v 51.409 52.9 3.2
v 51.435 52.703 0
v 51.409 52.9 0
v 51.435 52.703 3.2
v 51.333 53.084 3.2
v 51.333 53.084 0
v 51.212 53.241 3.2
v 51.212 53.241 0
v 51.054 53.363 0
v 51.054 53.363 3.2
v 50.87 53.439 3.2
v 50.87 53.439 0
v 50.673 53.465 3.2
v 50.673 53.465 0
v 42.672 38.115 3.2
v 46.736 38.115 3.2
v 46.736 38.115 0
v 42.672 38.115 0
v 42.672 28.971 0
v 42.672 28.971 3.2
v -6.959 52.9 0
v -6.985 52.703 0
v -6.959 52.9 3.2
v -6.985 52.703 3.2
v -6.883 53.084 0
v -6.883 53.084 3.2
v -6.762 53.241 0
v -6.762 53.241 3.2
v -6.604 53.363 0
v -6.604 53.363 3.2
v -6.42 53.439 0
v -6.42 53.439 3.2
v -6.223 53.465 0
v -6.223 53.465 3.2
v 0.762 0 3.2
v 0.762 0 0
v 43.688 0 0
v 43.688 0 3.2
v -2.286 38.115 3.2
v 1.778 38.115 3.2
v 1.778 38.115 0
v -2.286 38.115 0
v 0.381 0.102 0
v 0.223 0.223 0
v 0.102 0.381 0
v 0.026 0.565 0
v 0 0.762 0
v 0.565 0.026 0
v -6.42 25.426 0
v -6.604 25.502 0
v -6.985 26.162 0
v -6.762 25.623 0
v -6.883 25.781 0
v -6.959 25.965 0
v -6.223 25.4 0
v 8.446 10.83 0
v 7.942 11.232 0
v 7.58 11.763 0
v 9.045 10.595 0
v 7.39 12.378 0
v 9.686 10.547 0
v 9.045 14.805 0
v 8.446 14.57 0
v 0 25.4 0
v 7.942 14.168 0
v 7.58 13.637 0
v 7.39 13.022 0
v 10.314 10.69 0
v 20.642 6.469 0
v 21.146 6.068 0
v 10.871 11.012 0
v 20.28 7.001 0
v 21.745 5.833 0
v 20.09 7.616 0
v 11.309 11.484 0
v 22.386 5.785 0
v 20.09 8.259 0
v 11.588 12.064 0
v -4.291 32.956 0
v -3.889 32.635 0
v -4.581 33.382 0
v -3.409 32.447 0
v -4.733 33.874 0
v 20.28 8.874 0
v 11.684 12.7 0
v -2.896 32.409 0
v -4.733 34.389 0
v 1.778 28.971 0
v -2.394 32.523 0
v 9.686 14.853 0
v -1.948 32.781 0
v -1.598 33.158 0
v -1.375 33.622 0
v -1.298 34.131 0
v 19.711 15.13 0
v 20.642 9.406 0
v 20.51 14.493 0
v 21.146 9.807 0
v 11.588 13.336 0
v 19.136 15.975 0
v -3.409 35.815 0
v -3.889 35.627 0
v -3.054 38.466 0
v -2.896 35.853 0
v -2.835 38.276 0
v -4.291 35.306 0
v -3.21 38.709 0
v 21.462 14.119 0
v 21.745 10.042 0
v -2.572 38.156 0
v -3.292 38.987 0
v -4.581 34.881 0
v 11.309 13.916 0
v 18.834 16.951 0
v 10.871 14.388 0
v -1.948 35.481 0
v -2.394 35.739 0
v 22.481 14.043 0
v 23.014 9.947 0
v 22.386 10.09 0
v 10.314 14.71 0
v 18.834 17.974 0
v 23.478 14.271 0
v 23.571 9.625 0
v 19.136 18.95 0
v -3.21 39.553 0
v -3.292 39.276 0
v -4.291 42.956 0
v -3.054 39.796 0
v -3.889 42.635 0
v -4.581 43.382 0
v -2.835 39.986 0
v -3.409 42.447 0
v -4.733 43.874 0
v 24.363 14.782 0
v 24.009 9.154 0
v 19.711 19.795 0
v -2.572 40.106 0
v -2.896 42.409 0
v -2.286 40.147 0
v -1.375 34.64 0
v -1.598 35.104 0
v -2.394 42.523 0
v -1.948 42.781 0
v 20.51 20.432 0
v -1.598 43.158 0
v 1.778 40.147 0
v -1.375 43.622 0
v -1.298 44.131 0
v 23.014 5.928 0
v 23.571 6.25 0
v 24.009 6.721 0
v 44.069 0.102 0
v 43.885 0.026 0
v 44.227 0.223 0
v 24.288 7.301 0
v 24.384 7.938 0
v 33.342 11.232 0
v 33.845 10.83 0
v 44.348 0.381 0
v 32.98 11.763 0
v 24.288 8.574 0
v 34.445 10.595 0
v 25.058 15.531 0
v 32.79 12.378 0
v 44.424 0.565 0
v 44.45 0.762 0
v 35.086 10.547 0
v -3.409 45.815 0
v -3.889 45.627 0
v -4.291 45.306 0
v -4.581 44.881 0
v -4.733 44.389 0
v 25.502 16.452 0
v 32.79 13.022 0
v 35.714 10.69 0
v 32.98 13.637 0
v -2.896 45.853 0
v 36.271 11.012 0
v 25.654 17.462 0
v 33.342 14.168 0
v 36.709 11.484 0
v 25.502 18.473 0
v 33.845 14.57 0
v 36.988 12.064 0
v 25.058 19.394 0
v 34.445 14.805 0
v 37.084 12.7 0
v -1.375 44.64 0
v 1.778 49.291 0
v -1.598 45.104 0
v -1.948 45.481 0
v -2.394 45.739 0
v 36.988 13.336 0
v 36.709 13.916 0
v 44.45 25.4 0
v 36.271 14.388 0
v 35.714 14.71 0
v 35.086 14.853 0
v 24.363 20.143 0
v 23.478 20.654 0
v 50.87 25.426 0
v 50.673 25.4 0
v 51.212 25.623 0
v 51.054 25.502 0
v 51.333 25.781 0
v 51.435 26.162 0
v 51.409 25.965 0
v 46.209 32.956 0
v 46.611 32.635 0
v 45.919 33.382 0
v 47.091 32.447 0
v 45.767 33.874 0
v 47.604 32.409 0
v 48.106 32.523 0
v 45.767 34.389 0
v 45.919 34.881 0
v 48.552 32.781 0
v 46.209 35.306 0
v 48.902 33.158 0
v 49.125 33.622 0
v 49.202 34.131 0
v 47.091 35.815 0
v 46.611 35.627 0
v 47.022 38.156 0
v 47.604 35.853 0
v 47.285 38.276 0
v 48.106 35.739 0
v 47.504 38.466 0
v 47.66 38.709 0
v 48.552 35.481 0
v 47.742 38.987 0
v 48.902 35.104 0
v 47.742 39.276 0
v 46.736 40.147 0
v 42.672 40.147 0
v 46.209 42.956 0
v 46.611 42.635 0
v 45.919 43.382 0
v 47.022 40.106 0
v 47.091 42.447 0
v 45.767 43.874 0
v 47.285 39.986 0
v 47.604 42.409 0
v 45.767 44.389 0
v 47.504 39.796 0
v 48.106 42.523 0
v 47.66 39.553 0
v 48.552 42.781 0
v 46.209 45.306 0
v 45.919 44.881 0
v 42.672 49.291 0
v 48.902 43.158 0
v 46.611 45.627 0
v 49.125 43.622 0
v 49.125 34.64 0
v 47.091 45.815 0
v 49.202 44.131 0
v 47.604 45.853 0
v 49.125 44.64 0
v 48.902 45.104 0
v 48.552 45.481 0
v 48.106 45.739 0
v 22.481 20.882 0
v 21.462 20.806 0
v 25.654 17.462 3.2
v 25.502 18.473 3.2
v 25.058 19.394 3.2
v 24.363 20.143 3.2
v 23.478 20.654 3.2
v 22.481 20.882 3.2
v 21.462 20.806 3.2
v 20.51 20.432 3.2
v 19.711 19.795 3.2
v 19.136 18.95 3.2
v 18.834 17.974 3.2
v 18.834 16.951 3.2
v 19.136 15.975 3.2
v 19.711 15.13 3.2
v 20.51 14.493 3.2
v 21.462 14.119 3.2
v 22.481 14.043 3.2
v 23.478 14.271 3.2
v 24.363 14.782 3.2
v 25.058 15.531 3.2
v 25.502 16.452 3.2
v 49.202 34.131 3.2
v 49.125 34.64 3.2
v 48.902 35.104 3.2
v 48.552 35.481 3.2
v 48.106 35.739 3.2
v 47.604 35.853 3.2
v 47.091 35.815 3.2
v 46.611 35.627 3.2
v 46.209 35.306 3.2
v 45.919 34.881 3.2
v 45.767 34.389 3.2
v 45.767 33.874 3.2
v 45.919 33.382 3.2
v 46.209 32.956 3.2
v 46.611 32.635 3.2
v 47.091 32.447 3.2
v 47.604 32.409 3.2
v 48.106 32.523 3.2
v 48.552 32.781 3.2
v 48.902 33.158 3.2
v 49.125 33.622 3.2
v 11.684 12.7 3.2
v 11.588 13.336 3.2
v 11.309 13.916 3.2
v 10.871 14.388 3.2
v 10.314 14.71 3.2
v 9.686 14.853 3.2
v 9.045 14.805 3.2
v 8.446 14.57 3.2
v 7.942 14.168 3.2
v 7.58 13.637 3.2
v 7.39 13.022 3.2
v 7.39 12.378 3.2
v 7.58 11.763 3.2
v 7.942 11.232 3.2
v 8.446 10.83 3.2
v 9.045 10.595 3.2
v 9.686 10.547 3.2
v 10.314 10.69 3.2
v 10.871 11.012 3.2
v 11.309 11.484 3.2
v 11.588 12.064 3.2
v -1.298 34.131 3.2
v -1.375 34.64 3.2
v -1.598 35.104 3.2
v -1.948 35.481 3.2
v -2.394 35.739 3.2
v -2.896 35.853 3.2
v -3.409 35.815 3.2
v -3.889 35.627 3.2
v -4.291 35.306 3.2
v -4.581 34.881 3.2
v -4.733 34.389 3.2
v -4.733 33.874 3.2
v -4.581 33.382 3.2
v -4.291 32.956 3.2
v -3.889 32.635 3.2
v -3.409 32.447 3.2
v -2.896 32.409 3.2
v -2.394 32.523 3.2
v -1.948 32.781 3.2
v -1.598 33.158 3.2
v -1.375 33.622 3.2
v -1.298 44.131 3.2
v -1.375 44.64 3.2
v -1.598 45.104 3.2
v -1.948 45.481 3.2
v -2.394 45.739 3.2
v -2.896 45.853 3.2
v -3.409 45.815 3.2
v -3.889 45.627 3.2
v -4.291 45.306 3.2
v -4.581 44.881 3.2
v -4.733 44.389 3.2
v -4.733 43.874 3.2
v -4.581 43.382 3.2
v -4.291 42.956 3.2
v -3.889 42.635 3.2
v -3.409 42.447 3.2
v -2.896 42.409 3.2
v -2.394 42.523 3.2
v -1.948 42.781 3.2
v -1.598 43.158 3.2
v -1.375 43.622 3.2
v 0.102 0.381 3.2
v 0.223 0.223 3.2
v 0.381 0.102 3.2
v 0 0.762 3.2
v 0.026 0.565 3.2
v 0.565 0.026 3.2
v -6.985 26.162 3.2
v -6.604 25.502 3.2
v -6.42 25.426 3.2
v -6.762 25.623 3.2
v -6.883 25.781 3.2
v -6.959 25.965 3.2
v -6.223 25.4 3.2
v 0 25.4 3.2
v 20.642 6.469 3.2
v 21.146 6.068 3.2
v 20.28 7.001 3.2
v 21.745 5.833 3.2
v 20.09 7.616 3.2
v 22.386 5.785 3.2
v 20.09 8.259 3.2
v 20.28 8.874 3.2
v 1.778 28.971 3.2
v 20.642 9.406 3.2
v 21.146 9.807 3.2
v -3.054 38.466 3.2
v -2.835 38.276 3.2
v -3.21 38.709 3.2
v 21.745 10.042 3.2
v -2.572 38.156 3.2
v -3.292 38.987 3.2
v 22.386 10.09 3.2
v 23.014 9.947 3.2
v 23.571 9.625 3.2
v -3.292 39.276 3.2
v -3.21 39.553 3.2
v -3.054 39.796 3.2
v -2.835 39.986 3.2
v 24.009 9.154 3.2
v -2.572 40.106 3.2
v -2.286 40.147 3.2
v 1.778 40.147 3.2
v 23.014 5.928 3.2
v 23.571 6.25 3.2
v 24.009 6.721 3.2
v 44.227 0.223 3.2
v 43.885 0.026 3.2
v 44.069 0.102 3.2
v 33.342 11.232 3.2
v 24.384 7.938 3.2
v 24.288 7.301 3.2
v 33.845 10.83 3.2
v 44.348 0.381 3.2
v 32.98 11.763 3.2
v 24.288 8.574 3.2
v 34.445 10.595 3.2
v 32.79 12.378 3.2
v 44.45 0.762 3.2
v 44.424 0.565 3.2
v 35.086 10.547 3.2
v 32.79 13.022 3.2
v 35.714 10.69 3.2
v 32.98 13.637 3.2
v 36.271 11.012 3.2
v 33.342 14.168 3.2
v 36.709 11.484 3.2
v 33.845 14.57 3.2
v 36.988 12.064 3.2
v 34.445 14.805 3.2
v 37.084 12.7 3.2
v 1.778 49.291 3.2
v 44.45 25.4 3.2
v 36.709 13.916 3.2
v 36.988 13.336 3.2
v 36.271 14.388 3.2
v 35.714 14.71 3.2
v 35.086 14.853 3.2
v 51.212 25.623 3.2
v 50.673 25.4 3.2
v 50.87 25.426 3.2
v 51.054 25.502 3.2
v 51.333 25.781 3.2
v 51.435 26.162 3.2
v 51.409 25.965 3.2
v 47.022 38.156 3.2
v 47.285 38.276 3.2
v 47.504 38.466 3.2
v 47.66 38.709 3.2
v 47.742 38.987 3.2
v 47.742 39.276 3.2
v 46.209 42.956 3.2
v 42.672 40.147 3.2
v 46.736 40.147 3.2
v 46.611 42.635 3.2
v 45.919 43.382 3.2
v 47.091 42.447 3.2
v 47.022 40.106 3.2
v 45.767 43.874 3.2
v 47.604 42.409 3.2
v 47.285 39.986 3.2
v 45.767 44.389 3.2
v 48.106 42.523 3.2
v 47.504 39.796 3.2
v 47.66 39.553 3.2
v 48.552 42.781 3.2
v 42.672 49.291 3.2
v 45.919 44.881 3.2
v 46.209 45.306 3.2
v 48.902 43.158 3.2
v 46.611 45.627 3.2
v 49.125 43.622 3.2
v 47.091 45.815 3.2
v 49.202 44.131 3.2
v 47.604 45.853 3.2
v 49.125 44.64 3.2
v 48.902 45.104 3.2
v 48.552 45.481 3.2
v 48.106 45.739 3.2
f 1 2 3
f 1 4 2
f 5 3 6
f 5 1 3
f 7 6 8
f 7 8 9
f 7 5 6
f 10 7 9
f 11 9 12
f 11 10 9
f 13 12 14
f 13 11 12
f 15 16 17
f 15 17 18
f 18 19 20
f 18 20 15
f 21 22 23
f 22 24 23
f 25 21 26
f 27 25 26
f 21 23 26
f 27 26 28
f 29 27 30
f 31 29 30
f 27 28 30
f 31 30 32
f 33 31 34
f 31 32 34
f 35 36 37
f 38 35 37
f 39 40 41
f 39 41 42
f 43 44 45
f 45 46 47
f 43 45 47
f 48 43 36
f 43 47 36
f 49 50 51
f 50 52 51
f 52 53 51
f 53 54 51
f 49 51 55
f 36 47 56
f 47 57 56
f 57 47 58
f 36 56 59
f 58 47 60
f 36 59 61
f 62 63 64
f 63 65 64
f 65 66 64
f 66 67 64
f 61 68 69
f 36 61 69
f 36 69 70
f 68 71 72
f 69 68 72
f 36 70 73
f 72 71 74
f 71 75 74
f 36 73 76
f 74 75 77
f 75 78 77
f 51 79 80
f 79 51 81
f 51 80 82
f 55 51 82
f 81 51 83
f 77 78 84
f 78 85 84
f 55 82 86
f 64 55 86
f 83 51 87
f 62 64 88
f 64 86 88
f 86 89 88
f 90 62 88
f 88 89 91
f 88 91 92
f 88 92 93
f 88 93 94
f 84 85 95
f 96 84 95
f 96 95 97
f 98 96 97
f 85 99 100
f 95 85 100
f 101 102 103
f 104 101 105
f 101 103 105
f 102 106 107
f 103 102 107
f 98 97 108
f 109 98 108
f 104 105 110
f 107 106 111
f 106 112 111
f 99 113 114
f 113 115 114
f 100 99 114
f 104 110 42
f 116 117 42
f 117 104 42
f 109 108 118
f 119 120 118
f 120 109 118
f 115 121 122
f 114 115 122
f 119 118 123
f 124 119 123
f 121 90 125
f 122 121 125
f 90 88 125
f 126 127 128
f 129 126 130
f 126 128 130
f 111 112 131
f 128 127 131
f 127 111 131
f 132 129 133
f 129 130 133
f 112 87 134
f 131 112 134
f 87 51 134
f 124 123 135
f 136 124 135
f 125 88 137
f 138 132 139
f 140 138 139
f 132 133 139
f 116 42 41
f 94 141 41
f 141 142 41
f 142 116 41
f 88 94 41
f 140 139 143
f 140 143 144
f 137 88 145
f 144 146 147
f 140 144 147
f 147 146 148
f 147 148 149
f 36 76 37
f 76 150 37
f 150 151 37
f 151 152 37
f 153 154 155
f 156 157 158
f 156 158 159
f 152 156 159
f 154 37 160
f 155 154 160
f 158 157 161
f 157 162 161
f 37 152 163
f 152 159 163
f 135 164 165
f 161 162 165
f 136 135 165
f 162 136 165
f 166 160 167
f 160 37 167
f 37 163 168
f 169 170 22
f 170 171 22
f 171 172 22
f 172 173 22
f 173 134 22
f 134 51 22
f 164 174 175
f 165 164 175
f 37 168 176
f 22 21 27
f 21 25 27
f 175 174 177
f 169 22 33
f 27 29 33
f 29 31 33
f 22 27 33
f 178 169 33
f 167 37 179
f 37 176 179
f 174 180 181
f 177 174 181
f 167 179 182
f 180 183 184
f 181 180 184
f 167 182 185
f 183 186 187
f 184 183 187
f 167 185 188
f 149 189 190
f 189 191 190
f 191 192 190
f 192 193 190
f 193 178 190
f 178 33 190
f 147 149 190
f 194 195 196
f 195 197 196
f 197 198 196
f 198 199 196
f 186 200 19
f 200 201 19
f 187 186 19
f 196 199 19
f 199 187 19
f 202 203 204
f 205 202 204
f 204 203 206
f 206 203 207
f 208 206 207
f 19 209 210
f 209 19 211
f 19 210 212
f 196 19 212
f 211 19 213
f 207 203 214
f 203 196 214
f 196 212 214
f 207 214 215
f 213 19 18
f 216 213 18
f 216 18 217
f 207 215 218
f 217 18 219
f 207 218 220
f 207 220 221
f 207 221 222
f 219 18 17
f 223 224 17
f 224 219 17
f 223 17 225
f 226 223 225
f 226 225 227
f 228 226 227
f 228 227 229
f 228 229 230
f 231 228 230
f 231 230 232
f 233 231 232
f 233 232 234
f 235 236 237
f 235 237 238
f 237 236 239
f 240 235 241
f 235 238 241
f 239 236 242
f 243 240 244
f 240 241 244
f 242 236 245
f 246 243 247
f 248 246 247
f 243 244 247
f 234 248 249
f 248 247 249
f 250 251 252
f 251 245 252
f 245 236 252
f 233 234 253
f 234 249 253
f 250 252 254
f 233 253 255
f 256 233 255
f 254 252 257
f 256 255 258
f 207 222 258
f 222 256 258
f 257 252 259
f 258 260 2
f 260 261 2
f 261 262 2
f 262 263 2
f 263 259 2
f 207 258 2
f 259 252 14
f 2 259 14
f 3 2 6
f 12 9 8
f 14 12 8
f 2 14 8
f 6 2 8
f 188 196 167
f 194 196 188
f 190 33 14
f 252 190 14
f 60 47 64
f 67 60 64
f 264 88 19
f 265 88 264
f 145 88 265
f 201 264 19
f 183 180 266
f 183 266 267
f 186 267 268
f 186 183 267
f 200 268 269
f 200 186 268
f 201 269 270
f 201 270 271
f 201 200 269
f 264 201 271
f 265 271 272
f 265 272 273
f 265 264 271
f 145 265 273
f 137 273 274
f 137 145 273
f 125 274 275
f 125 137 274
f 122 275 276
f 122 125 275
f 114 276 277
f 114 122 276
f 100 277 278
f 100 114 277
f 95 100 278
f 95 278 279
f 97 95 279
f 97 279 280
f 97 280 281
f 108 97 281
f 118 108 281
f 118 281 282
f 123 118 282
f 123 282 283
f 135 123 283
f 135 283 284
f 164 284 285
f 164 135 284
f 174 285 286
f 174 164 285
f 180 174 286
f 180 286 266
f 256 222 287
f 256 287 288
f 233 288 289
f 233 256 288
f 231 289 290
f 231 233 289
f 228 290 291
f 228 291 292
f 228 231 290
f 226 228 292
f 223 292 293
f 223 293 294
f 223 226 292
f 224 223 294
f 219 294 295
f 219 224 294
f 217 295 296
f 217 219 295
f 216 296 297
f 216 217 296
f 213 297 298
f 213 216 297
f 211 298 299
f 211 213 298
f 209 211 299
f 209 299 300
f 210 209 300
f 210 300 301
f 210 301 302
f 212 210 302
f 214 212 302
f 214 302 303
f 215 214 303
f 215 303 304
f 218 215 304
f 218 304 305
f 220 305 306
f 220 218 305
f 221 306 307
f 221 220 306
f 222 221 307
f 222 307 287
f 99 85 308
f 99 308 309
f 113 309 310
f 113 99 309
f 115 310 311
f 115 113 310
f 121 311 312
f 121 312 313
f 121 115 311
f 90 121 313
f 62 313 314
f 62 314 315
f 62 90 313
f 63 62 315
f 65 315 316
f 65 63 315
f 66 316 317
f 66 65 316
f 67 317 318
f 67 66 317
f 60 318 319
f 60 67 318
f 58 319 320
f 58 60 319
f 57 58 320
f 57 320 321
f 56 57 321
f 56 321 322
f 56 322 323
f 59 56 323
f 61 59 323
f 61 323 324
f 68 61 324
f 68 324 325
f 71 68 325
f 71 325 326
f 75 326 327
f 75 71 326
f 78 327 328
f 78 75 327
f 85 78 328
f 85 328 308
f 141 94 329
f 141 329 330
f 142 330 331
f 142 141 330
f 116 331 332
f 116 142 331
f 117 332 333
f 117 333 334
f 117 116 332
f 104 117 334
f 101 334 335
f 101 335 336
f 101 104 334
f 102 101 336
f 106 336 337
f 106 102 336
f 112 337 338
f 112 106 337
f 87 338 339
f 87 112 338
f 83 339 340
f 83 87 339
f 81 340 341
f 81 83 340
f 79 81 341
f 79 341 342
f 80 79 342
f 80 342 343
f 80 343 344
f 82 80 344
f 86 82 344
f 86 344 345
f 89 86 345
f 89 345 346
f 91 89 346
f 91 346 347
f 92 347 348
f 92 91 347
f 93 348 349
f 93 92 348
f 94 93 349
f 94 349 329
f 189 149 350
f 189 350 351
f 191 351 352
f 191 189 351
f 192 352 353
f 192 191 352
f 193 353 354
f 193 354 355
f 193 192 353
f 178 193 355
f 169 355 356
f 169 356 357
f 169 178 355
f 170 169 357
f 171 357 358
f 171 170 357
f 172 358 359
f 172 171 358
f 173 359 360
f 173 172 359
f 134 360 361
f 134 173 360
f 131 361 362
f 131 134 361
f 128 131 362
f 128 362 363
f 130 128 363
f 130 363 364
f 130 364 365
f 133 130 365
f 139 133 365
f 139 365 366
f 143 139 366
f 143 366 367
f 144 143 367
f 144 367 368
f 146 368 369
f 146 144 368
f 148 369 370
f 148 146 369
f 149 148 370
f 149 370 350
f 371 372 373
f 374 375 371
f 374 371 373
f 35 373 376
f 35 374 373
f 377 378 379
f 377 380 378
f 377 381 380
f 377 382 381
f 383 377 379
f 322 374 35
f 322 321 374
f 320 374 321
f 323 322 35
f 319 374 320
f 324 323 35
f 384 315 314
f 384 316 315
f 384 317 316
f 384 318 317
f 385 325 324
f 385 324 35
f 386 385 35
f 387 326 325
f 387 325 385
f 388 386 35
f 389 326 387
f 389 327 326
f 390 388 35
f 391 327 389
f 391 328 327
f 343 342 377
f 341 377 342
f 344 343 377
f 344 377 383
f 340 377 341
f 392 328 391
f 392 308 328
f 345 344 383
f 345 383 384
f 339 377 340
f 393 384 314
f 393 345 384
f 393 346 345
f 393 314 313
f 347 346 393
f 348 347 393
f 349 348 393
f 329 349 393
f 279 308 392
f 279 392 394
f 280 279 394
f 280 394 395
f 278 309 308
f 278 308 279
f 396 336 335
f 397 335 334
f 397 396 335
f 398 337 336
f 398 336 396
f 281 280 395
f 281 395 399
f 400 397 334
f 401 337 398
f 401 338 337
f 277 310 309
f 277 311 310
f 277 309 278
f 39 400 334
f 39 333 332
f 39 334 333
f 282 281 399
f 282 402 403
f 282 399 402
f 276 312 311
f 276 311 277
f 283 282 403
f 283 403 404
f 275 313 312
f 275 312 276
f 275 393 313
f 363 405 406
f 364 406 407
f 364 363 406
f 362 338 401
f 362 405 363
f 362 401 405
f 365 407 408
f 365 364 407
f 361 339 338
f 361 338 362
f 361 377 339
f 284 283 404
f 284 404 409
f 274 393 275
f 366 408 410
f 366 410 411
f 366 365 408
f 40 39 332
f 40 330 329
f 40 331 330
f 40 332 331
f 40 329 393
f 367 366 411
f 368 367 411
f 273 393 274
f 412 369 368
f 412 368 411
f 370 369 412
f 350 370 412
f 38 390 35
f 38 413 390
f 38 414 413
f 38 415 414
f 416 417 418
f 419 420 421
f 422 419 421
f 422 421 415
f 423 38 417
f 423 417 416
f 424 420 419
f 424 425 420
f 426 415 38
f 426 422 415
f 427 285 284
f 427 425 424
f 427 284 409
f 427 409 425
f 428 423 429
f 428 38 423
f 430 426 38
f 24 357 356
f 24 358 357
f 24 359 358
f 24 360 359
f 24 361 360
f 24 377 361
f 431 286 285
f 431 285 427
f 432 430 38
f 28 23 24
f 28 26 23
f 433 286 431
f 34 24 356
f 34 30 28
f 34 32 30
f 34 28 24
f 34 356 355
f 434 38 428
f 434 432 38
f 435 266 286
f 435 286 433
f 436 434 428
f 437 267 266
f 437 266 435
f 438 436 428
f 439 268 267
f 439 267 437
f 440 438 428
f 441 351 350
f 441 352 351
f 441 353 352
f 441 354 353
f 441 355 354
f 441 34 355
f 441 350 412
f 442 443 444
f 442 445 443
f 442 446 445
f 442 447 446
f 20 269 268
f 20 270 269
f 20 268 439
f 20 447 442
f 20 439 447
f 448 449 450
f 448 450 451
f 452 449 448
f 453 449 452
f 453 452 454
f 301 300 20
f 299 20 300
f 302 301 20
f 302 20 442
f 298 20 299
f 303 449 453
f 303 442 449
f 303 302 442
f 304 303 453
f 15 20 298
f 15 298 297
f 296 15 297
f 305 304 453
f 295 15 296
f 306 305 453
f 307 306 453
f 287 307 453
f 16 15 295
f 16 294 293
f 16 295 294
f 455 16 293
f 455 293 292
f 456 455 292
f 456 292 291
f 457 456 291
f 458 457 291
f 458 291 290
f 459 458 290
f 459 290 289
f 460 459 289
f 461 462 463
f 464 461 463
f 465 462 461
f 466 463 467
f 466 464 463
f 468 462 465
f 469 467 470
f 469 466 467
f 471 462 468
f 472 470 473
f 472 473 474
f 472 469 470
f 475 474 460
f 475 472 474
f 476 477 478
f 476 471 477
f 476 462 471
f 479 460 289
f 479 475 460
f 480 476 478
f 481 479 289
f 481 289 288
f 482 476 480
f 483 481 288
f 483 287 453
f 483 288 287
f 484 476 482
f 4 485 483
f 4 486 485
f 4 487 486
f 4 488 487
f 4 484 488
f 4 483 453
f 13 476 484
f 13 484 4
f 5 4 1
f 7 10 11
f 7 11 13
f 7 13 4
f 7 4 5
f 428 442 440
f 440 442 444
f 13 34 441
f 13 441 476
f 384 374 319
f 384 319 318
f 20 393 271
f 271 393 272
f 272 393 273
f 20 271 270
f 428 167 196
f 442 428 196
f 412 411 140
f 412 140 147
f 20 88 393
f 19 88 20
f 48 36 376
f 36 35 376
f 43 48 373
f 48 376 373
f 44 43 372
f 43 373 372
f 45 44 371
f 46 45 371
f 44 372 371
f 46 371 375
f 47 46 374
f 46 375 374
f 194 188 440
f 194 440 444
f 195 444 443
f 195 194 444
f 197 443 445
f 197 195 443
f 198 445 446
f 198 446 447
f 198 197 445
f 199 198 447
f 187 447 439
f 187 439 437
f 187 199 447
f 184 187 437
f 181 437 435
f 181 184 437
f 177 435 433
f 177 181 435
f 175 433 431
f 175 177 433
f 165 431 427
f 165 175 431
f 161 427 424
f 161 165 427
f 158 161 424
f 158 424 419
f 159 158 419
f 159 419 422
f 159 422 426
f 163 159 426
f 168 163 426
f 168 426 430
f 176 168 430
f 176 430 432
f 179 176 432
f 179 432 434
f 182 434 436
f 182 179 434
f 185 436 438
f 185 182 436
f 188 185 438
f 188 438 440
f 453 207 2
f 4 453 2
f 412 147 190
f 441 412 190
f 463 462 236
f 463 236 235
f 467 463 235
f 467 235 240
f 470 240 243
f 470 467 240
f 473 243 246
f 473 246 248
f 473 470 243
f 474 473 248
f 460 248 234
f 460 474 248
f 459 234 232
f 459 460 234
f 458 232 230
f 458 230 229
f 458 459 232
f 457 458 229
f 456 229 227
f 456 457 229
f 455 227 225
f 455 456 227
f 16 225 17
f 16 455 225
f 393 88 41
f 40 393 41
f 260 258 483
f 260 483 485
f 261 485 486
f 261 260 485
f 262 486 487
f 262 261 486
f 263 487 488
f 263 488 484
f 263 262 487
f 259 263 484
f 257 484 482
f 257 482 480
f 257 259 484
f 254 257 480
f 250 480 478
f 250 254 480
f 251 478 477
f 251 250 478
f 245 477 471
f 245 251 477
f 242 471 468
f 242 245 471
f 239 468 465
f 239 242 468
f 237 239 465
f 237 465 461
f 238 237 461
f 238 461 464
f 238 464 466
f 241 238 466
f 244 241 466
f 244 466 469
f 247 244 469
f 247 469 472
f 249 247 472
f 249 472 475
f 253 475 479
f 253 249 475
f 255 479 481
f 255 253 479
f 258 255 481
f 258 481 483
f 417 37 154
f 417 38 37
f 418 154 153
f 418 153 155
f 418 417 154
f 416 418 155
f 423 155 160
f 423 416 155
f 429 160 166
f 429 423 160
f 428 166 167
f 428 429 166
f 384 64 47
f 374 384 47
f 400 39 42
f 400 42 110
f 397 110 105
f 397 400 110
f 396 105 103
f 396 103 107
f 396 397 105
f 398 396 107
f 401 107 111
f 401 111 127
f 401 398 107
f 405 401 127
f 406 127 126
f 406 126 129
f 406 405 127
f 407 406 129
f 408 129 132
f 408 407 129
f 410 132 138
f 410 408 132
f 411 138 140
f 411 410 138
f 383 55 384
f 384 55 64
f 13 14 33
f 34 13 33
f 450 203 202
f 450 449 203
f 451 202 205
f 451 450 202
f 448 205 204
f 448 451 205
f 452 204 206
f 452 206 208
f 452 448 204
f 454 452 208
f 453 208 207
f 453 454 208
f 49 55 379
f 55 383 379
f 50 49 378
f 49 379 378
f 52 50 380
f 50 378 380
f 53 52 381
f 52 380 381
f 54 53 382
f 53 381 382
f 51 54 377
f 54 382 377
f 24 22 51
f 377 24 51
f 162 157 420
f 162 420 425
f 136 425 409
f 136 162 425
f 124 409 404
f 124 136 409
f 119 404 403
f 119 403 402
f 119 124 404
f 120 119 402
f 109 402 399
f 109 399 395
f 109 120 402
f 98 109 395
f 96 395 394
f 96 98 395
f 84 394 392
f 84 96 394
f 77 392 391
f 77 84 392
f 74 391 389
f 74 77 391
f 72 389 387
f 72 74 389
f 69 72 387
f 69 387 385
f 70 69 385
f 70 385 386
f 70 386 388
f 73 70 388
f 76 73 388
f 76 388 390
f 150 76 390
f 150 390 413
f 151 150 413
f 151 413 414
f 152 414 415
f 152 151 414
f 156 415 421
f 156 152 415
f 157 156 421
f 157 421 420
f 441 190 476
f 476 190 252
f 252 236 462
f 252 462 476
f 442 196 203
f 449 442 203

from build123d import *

# Parameters (mm, degrees)
SKETCH1_R           = 2.159
SKETCH1_R_2         = 1.7272
SKETCH1_R_3         = 3.429
SKETCH1_W           = 40.894
SKETCH1_H           = 20.32
BOSS_EXTRUDE1_DEPTH = 3.2004
CUT_EXTRUDE1_DEPTH  = 3.2004
FILLET1_R           = 0.762


with BuildPart() as part:
    # Sketch1 → Boss-Extrude1 (new body)
    with BuildSketch(Plane.XY):
        Polygon((0, 0), (44.45, 0), (44.45, 25.4), (51.435, 25.4), (51.435, 53.464659022), (-6.985, 53.464659022), (-6.985, 25.4), (0, 25.4), align=None)
        with Locations((9.525, 12.7)):
            Circle(SKETCH1_R, mode=Mode.SUBTRACT)
        with Locations((34.925, 12.7)):
            Circle(SKETCH1_R, mode=Mode.SUBTRACT)
        with Locations((47.475, 34.131115311)):
            Circle(SKETCH1_R_2, mode=Mode.SUBTRACT)
        with Locations((-3.025, 44.131115311)):
            Circle(SKETCH1_R_2, mode=Mode.SUBTRACT)
        with Locations((-3.025, 34.131115311)):
            Circle(SKETCH1_R_2, mode=Mode.SUBTRACT)
        with Locations((47.475, 44.131115311)):
            Circle(SKETCH1_R_2, mode=Mode.SUBTRACT)
        with Locations((22.225, 17.4625)):
            Circle(SKETCH1_R_3, mode=Mode.SUBTRACT)
        with Locations((22.225, 7.9375)):
            Circle(SKETCH1_R, mode=Mode.SUBTRACT)
        with Locations((22.225, 39.131115311)):
            Rectangle(SKETCH1_W, SKETCH1_H, mode=Mode.SUBTRACT)
    extrude(amount=BOSS_EXTRUDE1_DEPTH)

    # Sketch2 → Cut-Extrude1 (cut)
    with BuildSketch(Plane.XY.offset(3.2004)):
        with BuildLine():
            Line((-2.286, 40.147115311), (1.778, 40.147115311))
            Line((1.778, 40.147115311), (1.778, 38.115115311))
            Line((1.778, 38.115115311), (-2.286, 38.115115311))
            ThreePointArc((-2.286, 38.115115311), (-3.302, 39.131115311), (-2.286, 40.147115311))
        make_face()
        with BuildLine():
            Line((42.672, 40.147115311), (46.736, 40.147115311))
            ThreePointArc((46.736, 40.147115311), (47.752, 39.131115311), (46.736, 38.115115311))
            Line((46.736, 38.115115311), (42.672, 38.115115311))
            Line((42.672, 38.115115311), (42.672, 40.147115311))
        make_face()
    extrude(amount=-CUT_EXTRUDE1_DEPTH, mode=Mode.SUBTRACT)

    # Fillet1
    fillet1_edges = [part.edges().sort_by_distance(p)[0] for p in [
        (51.435, 53.464659022, 1.6002),
        (51.435, 25.4, 1.6002),
        (44.45, 0, 1.6002),
        (0, 0, 1.6002),
        (-6.985, 25.4, 1.6002),
        (-6.985, 53.464659022, 1.6002),
    ]]
    fillet(fillet1_edges, radius=FILLET1_R)


solid = part.part
